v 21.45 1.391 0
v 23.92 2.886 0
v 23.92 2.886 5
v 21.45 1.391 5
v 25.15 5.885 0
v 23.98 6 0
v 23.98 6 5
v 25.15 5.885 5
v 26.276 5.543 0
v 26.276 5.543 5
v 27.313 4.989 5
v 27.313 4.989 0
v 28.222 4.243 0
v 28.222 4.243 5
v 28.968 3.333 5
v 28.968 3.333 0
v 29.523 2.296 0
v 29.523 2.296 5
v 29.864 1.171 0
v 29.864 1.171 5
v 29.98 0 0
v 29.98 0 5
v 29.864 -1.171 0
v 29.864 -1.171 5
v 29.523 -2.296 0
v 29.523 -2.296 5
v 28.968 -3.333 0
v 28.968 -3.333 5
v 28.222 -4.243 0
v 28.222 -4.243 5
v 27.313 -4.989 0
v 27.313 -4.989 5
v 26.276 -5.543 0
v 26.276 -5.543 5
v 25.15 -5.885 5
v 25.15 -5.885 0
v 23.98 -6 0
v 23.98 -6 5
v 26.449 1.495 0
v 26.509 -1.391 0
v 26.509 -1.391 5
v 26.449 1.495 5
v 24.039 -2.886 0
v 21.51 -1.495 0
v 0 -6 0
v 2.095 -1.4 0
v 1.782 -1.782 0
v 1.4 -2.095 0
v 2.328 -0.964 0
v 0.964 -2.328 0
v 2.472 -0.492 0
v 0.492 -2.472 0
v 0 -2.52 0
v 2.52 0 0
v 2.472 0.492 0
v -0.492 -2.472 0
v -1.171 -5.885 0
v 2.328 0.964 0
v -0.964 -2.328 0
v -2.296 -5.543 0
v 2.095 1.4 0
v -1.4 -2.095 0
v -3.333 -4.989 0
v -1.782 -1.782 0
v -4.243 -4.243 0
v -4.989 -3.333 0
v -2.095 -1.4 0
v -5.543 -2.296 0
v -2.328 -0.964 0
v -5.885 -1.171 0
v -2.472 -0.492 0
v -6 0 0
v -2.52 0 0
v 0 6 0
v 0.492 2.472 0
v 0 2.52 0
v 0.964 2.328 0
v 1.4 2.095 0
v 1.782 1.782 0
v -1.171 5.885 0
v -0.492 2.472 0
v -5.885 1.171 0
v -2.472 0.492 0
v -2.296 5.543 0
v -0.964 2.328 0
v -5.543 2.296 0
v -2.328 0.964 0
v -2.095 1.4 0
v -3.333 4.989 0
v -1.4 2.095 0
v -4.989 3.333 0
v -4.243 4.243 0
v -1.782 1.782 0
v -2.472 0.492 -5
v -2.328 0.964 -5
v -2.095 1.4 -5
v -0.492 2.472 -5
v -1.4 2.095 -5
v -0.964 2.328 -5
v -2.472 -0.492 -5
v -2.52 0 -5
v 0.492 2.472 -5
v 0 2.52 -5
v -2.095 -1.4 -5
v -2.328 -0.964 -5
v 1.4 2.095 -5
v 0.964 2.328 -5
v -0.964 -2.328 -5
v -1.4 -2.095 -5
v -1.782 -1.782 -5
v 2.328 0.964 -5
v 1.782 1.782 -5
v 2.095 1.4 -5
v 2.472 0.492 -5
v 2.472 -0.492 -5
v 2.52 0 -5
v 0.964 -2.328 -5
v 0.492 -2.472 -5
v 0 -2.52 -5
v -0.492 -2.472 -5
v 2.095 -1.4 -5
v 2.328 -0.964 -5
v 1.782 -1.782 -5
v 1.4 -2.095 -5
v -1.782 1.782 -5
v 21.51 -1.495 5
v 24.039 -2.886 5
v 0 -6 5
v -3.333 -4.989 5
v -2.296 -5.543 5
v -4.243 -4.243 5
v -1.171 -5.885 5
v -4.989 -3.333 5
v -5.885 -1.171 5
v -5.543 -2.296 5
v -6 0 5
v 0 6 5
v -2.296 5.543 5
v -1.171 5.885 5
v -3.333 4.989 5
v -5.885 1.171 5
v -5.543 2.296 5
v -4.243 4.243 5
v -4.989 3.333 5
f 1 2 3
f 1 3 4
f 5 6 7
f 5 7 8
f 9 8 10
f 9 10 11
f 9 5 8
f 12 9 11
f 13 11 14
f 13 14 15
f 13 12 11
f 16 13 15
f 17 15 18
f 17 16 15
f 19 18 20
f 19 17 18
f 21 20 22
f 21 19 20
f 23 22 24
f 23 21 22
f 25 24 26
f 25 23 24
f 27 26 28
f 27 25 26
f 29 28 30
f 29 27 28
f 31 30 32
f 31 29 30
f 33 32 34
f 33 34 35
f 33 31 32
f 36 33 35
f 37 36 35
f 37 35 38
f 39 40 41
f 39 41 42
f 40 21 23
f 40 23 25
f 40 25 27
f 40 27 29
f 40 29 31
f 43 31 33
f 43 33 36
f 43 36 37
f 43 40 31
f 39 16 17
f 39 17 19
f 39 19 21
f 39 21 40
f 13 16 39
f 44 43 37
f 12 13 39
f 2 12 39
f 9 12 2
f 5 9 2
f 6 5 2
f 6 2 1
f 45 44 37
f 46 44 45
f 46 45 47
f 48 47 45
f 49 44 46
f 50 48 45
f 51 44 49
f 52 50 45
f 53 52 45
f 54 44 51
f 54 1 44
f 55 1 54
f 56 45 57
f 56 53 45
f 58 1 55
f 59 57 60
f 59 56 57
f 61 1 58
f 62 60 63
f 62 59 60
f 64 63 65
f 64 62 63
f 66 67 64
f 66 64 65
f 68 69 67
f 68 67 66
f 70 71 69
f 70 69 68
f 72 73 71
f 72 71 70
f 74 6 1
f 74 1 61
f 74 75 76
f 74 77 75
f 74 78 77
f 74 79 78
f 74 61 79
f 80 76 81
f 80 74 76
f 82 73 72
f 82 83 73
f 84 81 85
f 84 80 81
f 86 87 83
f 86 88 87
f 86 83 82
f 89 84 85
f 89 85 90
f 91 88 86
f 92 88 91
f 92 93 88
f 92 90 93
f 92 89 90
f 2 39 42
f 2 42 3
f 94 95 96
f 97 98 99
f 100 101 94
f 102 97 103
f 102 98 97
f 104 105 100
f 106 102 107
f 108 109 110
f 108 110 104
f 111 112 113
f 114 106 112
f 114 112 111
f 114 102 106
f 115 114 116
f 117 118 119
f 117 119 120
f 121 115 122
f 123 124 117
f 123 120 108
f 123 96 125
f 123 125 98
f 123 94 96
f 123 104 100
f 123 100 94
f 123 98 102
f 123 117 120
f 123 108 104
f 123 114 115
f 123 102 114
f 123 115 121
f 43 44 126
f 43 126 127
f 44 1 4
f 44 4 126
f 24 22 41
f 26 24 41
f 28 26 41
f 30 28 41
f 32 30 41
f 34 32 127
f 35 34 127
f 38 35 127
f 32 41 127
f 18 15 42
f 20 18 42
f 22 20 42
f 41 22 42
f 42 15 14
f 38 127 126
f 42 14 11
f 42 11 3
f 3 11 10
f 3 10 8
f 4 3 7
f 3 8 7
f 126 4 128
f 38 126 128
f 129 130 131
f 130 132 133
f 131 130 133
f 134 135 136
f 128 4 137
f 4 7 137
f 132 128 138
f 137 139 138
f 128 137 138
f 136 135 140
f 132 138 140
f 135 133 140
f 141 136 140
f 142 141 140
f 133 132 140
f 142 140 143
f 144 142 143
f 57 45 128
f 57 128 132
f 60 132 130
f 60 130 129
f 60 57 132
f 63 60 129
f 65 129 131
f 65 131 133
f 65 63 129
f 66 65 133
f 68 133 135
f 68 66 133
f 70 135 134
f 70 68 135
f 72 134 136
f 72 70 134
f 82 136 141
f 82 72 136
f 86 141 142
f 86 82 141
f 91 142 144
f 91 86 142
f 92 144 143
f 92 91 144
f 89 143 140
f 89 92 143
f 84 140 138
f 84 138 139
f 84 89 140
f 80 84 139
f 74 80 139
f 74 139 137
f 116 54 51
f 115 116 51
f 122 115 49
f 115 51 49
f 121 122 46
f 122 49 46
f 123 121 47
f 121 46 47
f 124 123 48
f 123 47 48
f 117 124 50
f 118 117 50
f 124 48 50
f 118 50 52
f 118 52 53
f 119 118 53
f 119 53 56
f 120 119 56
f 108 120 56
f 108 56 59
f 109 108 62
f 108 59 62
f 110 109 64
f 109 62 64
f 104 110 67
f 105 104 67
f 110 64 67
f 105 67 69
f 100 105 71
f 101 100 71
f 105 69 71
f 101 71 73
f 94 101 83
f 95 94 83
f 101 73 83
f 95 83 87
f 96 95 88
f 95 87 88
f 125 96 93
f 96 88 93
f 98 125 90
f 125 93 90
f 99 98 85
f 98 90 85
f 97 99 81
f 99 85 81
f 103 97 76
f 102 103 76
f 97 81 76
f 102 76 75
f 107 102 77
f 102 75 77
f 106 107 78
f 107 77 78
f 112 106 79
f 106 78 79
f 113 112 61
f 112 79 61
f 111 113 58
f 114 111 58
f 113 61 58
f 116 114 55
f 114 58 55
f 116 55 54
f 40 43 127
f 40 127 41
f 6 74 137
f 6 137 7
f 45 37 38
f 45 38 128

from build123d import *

# Parameters (mm, degrees)
EXTRUDE_1_DEPTH = 5
SKETCH_3_R      = 2.52
EXTRUDE_3_DEPTH = 5


with BuildPart() as part:
    # 草图1 → 凸台-拉伸1 (new body)
    with BuildSketch(Plane.XY):
        with BuildLine():
            Line((0, 6), (23.979571043, 6))
            ThreePointArc((23.979571043, 6), (29.979571043, 0), (23.979571043, -6))
            Line((23.979571043, -6), (0, -6))
            ThreePointArc((0, -6), (-6, 0), (0, 6))
        make_face()
        Polygon((26.50899235, -1.391172594), (26.449072504, 1.494956812), (23.919651197, 2.886129406), (21.450149737, 1.391172594), (21.510069583, -1.494956812), (24.039490889, -2.886129406), align=None, mode=Mode.SUBTRACT)
    extrude(amount=EXTRUDE_1_DEPTH)

    # 草图3 → 凸台-拉伸3 (add)
    with BuildSketch(Plane(origin=(0, 0, 0), x_dir=(-1, 0, 0), z_dir=(0, 0, -1))):
        with Locations(Location((0, 0, 0), (0, 0, 180))):
            Circle(SKETCH_3_R)
    extrude(amount=EXTRUDE_3_DEPTH)


solid = part.part
